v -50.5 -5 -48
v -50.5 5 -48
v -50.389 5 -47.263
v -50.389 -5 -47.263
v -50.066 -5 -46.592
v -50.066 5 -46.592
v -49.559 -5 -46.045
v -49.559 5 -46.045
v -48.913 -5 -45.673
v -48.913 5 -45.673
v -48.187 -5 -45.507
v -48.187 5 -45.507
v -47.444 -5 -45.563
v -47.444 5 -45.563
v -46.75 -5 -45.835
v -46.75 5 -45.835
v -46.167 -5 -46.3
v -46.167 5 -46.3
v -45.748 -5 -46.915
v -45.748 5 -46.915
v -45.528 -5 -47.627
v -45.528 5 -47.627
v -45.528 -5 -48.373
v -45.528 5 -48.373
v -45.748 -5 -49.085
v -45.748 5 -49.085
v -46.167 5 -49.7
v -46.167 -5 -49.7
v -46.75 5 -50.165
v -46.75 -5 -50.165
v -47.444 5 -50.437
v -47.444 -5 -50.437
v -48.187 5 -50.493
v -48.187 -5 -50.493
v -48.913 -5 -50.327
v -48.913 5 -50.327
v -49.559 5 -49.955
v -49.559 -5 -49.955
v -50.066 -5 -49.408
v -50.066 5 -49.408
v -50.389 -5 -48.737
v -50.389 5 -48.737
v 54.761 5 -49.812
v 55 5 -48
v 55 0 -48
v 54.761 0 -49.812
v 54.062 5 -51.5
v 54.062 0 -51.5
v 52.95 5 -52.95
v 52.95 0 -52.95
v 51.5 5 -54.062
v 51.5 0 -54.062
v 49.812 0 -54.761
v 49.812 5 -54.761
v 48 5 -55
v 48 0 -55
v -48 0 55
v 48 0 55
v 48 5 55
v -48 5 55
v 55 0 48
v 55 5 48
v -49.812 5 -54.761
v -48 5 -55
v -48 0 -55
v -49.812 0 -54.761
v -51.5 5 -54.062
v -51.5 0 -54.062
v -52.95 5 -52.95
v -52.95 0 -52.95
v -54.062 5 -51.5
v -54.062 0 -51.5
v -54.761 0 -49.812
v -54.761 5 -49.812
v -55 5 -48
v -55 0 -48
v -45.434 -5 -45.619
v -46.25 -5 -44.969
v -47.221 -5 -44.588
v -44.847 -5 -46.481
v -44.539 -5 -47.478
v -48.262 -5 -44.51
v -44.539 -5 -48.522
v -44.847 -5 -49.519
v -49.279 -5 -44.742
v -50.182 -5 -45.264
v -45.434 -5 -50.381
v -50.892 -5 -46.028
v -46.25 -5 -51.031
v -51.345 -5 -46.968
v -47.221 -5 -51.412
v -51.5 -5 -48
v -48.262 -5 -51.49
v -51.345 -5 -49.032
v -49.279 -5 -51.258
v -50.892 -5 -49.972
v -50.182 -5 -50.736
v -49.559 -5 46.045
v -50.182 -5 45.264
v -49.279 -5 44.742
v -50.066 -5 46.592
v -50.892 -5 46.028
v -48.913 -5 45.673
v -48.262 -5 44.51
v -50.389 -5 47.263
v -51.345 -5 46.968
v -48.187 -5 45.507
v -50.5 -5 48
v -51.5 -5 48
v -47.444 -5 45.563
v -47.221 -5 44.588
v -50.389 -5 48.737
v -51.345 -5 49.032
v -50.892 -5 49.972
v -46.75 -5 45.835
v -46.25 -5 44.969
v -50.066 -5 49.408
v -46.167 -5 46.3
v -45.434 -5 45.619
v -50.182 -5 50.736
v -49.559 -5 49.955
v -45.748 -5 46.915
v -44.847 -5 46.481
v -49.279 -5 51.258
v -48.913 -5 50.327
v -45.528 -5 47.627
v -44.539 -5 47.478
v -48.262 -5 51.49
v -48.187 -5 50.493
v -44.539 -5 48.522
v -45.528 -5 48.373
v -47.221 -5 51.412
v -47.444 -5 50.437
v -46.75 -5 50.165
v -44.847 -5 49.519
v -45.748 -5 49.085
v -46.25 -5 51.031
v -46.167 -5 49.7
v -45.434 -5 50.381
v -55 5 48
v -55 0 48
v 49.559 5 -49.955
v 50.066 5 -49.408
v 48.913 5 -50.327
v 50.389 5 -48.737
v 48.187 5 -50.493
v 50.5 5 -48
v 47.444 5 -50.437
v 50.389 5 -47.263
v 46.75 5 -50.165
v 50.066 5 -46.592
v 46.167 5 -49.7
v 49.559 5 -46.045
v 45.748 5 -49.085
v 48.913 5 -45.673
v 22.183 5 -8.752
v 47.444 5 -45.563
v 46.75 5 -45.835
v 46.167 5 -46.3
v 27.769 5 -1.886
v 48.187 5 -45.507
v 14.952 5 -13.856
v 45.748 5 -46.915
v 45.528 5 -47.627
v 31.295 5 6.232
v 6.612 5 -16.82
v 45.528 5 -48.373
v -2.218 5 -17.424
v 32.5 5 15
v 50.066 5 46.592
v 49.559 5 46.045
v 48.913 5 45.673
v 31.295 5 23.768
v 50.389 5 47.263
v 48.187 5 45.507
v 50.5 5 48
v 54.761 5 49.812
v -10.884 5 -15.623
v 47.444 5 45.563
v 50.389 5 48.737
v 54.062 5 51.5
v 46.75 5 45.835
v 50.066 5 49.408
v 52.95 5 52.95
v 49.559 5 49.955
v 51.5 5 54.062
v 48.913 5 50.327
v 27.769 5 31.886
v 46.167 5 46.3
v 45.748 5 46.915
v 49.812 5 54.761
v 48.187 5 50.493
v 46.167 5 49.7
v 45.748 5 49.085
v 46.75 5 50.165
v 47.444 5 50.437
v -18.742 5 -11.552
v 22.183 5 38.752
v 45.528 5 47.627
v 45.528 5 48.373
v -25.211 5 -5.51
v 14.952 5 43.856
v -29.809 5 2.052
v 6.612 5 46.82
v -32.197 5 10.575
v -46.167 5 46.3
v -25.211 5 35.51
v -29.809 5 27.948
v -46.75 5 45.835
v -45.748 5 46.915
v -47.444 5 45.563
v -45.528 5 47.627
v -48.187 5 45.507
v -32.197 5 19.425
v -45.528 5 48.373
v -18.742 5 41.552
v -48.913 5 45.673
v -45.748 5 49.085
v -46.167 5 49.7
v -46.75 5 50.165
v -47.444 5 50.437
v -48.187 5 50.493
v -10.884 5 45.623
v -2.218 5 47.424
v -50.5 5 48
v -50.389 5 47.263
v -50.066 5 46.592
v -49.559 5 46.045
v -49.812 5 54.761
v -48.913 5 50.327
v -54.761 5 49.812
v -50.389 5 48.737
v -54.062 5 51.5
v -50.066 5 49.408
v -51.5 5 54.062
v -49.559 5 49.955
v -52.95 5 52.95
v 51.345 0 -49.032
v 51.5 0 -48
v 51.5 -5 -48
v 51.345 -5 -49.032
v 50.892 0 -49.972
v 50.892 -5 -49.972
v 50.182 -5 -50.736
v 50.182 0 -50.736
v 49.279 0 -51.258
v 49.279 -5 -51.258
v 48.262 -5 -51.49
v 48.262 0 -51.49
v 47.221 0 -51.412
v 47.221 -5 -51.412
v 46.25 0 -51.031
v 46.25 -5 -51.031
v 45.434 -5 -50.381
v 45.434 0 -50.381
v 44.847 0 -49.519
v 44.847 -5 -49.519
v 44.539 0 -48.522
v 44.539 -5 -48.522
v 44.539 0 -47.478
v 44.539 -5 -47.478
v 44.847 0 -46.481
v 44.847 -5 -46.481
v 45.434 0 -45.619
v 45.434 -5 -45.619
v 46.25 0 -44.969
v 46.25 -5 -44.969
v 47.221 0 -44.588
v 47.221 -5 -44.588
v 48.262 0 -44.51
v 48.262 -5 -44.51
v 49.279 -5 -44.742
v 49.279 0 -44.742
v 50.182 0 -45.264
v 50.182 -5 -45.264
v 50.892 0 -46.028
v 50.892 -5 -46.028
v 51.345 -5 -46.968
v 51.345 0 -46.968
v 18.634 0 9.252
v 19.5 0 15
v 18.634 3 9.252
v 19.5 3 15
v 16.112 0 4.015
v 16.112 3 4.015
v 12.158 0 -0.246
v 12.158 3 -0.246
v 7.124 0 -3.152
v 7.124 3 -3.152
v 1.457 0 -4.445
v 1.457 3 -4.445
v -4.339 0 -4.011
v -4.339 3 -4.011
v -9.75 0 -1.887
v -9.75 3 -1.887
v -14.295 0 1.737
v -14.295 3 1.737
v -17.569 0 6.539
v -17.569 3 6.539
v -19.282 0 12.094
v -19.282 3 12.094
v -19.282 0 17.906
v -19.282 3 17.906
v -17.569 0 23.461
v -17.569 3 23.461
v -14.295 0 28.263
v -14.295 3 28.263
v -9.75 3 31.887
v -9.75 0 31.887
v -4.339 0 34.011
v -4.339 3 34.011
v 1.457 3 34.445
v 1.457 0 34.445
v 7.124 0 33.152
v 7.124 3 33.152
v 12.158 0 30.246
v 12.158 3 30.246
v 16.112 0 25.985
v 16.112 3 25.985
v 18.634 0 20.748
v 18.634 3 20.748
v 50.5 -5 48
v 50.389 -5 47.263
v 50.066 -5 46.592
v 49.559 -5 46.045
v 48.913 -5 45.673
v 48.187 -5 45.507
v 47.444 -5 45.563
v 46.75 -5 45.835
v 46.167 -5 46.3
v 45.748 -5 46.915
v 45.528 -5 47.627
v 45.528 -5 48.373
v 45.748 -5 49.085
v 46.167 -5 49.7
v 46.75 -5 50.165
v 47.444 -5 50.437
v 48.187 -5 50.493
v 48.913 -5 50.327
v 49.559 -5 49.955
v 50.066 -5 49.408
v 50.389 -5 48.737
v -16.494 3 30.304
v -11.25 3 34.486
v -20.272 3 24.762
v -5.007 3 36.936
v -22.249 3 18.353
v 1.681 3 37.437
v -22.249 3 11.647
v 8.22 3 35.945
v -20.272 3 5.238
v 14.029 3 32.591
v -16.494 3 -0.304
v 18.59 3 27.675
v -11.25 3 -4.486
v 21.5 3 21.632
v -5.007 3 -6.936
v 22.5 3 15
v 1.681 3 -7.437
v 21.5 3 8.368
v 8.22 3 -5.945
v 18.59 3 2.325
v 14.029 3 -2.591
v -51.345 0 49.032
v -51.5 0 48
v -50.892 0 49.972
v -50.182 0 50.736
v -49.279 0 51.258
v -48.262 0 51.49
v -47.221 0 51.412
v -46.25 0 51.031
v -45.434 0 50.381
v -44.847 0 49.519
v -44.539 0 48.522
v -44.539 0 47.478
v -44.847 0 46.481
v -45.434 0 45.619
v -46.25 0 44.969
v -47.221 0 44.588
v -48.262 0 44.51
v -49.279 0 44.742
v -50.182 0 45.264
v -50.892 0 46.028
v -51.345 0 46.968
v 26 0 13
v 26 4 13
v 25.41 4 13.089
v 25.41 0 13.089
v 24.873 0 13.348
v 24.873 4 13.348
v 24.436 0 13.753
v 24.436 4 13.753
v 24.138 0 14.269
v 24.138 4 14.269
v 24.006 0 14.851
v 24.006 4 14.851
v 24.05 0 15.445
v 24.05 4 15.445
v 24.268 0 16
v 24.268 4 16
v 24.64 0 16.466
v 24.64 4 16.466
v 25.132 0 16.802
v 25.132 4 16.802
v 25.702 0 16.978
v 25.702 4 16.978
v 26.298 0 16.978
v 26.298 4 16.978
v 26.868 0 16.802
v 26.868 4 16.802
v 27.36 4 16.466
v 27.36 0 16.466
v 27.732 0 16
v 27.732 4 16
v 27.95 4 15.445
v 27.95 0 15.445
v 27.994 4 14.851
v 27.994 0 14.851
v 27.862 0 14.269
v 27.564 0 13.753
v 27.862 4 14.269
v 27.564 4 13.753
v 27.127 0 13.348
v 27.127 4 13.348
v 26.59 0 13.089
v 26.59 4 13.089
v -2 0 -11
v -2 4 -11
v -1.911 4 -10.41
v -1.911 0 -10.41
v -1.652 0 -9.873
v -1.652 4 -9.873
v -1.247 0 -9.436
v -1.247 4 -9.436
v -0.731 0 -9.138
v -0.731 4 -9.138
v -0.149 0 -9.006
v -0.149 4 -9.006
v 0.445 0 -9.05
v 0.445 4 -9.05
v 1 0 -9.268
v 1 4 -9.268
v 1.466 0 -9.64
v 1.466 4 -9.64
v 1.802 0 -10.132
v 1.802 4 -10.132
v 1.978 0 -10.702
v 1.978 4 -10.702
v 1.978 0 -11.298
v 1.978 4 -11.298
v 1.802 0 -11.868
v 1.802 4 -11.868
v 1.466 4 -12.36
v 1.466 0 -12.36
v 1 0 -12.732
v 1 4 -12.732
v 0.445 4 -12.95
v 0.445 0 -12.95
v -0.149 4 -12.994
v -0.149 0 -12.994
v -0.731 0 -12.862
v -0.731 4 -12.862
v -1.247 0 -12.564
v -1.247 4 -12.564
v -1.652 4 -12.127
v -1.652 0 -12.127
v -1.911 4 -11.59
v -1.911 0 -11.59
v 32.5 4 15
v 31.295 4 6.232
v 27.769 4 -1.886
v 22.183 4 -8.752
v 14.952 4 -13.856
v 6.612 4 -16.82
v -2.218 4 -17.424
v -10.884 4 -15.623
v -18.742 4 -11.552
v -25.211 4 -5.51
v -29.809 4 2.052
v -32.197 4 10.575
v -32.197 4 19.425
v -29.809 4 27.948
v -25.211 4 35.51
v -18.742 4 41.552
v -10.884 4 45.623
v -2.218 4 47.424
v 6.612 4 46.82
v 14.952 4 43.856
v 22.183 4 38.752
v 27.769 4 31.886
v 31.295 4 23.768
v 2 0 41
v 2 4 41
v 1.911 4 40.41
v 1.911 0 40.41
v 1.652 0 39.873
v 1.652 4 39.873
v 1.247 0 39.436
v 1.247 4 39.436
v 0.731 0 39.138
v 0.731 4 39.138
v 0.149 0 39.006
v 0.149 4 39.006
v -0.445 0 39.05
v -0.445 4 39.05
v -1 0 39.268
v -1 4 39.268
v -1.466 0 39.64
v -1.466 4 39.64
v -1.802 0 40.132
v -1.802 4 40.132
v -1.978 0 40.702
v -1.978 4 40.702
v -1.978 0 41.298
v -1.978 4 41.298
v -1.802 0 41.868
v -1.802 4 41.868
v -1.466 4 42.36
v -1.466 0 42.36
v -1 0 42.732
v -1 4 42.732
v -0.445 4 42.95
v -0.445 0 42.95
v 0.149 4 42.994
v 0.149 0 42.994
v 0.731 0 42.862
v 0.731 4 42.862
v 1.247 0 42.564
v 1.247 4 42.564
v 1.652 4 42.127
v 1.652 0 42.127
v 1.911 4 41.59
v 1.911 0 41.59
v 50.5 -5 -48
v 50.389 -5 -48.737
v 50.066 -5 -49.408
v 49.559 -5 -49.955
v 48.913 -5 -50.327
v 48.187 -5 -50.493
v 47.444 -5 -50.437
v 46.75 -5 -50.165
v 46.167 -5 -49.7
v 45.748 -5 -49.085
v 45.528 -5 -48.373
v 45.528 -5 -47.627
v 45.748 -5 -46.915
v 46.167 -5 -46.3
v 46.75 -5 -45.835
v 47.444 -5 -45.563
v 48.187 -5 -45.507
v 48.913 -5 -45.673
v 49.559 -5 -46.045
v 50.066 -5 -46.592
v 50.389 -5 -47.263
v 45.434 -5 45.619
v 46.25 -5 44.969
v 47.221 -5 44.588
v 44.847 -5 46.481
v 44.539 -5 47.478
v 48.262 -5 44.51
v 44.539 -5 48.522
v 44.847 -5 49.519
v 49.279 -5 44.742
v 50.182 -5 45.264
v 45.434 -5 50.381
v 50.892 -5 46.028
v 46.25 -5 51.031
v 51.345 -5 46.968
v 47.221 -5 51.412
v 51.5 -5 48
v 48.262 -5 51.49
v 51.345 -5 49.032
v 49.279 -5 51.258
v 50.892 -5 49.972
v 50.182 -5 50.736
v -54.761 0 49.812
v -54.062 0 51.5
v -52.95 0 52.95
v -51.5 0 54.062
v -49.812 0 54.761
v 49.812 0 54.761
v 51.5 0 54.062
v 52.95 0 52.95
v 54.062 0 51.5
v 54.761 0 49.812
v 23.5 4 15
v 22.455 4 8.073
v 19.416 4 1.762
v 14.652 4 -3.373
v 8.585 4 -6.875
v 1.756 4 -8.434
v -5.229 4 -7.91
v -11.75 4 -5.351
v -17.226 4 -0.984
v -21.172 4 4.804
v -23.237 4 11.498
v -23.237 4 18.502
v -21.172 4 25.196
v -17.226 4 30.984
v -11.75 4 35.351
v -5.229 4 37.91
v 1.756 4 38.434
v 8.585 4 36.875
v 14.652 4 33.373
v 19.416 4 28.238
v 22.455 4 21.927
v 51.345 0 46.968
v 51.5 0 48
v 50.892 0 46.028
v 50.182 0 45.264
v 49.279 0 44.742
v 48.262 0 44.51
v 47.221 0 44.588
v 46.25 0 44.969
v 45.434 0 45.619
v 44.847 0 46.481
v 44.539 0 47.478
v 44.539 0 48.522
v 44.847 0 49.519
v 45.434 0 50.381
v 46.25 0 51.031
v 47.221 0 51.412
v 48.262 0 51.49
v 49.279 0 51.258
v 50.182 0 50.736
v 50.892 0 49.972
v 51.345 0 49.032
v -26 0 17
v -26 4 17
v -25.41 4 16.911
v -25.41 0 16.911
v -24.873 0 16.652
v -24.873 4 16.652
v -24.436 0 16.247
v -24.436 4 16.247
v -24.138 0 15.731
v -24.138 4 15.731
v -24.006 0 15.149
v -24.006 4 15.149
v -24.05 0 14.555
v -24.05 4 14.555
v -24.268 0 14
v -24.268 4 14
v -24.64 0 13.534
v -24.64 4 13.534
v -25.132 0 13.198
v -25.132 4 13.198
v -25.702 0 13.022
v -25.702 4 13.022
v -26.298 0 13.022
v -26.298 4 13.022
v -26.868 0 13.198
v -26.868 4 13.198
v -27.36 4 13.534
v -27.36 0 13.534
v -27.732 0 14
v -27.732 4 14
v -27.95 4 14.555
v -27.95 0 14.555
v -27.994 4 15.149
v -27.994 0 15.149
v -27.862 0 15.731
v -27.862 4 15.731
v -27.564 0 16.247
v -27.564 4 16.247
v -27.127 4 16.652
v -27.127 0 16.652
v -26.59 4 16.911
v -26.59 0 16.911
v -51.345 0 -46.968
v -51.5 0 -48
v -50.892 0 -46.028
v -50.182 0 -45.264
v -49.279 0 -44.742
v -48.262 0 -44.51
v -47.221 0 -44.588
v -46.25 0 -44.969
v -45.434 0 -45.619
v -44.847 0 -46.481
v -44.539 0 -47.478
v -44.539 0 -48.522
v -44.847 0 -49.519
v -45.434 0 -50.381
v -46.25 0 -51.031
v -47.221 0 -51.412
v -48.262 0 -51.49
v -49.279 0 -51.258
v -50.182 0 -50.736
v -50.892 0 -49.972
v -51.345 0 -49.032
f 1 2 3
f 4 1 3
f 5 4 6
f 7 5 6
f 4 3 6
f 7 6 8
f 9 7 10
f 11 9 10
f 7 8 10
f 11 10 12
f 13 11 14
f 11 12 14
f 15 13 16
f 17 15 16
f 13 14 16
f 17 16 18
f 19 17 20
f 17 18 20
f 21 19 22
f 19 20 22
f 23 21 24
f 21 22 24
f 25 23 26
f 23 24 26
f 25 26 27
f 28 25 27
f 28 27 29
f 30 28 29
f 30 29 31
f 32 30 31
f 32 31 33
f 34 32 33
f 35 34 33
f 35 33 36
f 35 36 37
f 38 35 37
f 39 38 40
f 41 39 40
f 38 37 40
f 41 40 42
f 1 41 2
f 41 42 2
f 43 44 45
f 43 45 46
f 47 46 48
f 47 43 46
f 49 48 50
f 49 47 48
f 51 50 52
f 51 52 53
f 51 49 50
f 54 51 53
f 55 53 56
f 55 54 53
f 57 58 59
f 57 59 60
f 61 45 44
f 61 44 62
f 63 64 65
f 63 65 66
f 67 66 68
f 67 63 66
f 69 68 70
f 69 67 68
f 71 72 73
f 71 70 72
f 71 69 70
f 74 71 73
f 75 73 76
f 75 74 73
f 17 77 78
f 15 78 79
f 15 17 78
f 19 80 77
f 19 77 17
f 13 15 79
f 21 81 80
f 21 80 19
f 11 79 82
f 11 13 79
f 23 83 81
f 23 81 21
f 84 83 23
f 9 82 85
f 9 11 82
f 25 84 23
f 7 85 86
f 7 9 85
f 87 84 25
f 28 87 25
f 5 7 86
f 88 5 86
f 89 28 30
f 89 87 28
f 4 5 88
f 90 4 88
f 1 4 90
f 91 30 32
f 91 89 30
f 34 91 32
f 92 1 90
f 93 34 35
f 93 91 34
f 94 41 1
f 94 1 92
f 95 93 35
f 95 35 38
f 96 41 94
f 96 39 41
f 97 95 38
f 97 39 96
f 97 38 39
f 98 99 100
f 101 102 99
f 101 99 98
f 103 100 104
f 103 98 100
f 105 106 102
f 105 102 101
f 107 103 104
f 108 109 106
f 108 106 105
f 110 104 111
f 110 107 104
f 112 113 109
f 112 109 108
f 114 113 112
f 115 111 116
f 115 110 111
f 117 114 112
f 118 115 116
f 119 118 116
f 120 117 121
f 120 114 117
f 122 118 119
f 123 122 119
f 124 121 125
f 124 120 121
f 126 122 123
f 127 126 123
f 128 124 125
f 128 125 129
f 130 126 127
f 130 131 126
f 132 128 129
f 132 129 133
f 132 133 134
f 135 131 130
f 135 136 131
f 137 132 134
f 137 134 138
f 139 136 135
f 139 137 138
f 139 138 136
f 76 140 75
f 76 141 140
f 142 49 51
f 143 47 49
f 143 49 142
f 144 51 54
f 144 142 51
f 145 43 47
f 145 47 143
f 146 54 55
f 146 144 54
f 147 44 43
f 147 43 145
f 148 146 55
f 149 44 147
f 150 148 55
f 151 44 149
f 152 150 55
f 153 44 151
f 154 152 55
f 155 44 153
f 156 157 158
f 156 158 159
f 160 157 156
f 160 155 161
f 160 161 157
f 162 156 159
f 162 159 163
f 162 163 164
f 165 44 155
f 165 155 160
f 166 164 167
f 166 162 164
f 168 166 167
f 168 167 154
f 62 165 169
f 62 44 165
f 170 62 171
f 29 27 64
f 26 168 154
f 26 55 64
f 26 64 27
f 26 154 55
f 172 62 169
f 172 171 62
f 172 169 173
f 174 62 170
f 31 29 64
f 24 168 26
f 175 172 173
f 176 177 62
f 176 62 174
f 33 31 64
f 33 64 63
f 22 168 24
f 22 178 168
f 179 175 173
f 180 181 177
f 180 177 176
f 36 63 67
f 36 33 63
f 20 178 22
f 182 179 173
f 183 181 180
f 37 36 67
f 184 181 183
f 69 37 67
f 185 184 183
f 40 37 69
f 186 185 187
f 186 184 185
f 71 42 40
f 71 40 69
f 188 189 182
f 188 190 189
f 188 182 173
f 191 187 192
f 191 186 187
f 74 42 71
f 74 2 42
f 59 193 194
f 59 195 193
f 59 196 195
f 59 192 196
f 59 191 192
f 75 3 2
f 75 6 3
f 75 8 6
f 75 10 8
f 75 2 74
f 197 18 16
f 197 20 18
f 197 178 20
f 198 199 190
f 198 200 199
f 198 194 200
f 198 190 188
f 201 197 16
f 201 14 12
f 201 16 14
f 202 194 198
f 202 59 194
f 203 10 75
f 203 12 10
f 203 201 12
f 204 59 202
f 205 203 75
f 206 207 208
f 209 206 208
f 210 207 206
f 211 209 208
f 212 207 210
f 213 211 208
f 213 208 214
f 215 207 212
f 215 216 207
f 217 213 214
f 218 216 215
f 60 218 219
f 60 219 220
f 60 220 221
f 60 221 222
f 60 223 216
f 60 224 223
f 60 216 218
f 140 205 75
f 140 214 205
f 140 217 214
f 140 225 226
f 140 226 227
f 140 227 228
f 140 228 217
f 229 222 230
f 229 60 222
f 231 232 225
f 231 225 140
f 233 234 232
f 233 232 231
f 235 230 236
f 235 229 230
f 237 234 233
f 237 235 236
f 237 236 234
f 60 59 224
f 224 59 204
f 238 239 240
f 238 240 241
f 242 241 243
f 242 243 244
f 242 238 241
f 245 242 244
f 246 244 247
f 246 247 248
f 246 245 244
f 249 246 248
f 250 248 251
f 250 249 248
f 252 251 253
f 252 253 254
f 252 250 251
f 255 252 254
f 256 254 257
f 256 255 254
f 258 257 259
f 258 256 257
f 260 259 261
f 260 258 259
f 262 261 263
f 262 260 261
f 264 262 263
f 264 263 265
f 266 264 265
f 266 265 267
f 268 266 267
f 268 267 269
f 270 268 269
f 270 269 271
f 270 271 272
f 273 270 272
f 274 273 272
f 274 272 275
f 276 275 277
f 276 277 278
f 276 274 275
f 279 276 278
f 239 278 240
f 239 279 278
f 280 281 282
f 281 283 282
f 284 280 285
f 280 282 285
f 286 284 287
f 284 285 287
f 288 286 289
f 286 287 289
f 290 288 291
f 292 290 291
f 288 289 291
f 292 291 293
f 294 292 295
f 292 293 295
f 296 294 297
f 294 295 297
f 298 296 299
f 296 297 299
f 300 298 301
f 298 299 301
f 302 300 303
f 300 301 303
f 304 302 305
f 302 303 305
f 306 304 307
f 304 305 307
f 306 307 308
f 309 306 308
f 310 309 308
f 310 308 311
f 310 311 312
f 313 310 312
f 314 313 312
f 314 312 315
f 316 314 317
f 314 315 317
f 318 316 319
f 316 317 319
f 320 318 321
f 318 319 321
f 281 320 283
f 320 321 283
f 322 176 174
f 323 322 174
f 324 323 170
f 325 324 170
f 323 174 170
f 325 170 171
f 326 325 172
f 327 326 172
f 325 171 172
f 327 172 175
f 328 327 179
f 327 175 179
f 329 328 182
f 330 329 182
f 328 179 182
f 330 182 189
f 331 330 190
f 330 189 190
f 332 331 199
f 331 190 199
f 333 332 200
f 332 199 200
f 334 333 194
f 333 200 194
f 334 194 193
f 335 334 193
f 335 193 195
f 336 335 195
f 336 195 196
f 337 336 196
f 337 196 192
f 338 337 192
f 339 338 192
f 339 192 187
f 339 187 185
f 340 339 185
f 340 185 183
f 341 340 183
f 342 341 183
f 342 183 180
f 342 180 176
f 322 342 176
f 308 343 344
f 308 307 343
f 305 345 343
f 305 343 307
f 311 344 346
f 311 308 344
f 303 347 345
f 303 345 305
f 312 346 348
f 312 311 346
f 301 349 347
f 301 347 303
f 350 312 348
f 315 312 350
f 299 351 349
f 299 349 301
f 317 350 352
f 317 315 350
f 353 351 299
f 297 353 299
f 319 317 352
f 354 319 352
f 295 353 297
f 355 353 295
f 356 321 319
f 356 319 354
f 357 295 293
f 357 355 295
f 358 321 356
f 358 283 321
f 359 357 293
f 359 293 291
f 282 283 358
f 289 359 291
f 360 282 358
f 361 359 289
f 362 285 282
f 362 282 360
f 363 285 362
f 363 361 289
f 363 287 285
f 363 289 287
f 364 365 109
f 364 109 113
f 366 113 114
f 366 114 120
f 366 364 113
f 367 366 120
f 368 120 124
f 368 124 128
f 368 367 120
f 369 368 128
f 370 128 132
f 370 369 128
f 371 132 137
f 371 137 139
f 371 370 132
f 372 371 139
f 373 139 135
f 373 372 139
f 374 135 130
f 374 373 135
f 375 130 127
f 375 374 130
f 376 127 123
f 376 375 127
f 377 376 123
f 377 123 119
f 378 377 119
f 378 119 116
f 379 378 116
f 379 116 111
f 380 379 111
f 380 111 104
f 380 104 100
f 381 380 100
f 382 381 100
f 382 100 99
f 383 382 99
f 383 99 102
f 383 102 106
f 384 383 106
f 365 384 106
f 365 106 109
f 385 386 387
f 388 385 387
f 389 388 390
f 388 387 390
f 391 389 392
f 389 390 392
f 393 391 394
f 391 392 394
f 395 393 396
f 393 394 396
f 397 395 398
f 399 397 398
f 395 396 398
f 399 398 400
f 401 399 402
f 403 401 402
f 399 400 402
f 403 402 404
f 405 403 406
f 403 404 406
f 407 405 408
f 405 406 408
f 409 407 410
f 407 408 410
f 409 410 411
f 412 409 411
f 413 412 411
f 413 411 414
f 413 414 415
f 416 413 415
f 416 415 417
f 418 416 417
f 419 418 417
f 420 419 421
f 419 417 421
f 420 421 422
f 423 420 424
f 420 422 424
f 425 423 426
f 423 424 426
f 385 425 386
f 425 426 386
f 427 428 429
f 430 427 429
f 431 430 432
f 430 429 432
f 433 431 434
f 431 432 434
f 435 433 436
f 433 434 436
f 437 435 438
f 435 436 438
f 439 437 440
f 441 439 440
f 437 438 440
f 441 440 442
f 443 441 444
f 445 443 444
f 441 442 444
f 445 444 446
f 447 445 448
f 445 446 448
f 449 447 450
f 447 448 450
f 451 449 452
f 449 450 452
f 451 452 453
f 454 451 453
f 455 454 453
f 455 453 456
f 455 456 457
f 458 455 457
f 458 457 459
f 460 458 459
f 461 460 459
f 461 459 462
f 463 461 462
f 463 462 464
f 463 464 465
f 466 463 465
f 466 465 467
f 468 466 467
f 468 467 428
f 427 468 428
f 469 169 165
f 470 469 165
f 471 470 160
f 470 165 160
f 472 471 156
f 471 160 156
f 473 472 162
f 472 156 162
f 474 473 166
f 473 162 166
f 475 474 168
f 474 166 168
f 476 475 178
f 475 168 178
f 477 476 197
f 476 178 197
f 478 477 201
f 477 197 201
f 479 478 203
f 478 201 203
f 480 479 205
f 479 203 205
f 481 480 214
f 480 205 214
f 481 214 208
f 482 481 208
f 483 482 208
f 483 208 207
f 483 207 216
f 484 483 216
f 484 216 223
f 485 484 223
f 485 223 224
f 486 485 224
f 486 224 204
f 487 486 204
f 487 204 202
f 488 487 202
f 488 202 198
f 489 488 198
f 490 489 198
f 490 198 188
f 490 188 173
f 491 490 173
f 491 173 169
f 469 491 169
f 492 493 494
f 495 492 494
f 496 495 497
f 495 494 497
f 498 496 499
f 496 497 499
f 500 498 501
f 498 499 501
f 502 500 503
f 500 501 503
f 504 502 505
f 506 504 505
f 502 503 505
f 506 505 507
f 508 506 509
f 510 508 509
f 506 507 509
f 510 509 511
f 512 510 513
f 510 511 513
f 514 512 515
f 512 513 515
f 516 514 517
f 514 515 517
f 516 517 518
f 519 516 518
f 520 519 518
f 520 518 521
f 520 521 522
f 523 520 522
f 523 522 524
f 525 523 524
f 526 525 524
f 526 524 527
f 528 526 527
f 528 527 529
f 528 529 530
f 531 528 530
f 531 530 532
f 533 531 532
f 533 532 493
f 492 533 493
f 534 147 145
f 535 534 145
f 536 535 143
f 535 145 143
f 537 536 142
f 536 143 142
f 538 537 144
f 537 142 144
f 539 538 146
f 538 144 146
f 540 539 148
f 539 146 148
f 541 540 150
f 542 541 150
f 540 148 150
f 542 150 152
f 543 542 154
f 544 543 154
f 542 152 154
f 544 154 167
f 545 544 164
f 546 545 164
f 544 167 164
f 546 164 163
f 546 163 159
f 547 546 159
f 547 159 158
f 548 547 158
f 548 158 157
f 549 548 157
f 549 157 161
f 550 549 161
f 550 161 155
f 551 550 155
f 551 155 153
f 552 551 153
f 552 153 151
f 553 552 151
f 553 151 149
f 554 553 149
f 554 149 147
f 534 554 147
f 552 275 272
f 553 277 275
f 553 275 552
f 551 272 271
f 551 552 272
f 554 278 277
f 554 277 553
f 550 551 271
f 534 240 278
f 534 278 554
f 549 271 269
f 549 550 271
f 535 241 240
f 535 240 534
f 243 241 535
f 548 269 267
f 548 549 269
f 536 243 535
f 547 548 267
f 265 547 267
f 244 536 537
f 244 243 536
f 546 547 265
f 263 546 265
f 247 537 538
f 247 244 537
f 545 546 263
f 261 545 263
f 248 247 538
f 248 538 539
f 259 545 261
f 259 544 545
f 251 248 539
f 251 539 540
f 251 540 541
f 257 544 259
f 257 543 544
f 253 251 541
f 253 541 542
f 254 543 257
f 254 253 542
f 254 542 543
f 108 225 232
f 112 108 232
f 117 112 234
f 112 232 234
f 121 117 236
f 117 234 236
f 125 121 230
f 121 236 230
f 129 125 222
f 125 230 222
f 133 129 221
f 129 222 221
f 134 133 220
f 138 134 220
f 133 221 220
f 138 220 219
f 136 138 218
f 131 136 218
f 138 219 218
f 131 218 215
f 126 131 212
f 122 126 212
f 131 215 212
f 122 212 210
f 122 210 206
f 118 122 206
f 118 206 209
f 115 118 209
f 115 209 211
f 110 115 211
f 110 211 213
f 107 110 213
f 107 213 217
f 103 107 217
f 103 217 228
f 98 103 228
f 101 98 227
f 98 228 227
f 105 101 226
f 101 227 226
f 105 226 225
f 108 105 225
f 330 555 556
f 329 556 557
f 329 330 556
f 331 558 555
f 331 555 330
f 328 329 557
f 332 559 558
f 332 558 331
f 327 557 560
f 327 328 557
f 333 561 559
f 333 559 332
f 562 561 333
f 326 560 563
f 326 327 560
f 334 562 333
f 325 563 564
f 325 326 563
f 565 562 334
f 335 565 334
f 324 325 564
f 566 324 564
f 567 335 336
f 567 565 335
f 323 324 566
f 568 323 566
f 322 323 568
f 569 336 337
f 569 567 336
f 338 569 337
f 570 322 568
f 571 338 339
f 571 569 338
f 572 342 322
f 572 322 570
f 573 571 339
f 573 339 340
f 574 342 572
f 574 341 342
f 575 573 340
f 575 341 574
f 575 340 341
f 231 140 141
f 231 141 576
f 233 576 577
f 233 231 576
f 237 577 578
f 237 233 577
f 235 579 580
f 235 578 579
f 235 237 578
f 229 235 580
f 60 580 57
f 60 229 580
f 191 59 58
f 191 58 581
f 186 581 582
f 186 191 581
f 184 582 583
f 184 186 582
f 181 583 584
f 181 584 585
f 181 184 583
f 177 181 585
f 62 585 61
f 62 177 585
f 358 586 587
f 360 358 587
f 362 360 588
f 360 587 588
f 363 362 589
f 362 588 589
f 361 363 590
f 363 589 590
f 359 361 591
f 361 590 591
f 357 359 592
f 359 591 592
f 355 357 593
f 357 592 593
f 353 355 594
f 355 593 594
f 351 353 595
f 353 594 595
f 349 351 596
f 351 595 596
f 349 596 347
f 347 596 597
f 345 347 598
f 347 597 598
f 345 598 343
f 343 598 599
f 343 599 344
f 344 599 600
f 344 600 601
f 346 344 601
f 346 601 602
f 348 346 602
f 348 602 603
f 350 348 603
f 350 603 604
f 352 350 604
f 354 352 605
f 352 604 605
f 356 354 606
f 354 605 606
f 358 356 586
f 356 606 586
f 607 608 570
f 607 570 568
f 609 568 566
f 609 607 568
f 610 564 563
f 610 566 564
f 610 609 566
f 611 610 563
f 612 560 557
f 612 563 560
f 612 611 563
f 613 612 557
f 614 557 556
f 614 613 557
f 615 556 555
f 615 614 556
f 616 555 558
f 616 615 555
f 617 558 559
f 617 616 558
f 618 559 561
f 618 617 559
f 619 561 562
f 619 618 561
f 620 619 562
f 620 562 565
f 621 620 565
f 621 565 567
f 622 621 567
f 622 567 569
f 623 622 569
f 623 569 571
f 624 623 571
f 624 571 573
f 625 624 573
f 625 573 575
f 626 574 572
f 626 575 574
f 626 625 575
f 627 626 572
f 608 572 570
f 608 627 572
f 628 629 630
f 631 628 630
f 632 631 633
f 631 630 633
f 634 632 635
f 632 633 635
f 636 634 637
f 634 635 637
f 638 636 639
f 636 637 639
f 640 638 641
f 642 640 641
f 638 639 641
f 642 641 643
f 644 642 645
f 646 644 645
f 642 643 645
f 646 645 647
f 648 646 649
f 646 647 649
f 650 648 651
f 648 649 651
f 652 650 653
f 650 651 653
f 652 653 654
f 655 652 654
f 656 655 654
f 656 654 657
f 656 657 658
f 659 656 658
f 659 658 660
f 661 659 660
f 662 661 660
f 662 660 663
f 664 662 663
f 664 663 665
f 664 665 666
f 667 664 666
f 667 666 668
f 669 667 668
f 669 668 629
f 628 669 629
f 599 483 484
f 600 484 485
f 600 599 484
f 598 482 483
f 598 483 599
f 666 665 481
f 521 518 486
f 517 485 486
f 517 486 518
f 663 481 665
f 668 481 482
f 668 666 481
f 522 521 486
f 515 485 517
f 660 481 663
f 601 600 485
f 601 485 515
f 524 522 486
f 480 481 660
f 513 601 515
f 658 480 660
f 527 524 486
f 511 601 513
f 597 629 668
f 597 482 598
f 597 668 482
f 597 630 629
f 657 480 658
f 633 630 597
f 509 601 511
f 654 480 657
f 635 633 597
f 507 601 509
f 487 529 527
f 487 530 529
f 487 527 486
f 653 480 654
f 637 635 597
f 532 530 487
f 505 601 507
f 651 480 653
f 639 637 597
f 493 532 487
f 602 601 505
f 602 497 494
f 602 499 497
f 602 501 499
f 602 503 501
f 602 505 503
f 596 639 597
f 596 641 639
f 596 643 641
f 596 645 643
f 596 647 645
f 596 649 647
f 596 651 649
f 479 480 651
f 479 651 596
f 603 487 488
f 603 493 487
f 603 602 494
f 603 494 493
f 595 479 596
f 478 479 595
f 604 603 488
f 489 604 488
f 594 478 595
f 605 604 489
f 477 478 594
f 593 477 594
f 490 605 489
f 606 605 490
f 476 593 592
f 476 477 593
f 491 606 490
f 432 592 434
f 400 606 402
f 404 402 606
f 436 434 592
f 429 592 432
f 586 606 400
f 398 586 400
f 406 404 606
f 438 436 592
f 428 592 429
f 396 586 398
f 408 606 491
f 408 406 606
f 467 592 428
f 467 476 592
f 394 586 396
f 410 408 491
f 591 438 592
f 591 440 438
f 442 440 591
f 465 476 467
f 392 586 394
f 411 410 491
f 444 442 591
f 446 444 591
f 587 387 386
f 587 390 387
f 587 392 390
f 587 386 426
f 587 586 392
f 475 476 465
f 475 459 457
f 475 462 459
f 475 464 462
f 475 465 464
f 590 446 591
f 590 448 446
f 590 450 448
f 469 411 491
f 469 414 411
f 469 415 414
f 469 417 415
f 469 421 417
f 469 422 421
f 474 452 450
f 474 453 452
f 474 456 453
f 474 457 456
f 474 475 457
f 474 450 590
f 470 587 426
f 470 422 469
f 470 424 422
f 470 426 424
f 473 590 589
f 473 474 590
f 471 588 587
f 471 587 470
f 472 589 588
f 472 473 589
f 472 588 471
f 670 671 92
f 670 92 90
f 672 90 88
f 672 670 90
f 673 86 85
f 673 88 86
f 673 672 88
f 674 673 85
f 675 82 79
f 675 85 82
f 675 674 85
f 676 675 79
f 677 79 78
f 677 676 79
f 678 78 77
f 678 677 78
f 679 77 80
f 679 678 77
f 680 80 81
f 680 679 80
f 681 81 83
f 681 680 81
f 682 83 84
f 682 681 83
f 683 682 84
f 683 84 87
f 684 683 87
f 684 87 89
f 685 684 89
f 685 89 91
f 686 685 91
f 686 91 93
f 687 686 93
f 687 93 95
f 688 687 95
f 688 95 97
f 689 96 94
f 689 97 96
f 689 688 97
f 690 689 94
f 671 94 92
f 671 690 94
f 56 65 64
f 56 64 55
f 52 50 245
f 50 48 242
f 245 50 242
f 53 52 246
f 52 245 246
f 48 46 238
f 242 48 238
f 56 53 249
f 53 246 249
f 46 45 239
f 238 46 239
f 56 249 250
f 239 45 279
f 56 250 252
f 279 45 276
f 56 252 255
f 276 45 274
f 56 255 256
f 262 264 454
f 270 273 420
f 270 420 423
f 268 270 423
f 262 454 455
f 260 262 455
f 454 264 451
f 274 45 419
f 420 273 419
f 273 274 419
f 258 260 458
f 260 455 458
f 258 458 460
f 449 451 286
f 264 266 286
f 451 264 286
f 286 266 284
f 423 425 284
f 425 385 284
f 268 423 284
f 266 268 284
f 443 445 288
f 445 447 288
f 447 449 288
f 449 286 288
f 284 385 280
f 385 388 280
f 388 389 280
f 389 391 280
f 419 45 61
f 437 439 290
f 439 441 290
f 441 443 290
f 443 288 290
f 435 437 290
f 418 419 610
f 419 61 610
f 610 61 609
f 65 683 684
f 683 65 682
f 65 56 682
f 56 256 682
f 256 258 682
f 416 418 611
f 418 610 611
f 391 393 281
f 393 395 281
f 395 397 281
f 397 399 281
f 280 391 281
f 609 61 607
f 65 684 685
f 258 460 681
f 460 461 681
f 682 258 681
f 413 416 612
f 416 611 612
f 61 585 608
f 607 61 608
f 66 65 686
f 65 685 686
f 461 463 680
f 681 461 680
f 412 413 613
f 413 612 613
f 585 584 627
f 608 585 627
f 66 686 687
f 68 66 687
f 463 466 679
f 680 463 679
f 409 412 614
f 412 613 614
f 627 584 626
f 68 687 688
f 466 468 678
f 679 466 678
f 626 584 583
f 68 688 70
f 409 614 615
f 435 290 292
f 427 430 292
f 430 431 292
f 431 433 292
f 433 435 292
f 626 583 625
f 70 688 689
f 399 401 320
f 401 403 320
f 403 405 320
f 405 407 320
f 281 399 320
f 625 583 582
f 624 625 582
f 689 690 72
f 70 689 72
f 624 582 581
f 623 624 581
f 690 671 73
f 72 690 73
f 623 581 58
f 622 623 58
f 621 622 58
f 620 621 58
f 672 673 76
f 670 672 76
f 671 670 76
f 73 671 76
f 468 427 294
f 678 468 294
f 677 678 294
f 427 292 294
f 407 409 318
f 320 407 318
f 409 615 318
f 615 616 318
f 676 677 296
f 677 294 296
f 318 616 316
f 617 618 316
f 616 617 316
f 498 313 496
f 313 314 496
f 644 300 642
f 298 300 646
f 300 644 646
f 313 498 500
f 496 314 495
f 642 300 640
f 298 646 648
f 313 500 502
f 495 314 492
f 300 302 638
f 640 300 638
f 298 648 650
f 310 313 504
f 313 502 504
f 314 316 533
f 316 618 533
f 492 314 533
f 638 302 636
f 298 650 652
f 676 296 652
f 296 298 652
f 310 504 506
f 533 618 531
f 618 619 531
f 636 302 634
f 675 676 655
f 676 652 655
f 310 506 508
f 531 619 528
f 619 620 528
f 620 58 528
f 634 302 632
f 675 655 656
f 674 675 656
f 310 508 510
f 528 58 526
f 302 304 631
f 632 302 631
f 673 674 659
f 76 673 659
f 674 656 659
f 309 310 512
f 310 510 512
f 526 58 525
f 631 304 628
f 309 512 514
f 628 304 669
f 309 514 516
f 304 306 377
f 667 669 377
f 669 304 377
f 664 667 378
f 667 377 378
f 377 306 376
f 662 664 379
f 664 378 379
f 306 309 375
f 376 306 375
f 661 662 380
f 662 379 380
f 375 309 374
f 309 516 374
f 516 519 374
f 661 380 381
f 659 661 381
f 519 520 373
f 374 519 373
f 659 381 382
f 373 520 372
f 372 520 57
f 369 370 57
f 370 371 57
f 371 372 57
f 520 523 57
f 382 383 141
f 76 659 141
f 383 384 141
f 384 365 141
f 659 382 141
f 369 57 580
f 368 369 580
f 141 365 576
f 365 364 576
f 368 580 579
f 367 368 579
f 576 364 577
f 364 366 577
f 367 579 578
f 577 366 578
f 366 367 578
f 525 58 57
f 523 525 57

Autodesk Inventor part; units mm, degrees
ref_plane "YZ Plane" through (0, 0, 0) normal (1, 0, 0) x (0, 1, 0)
ref_plane "XZ Plane" through (0, 0, 0) normal (0, 1, 0) x (-1, 0, 0)
ref_plane "XY Plane" through (0, 0, 0) normal (0, 0, 1) x (1, 0, 0)
sketch "스케치1" plane through (0, 0, 0) normal (0, 1, 0) x (-1, 0, 0)
  line L0 (-55, 55) -> (55, 55)
  line L1 (55, 55) -> (55, -55)
  line L2 (55, -55) -> (-55, -55)
  line L3 (-55, -55) -> (-55, 55)
  line L4 (-55, 55) -> (55, -55) construction
  line L5 (55, 55) -> (-55, -55) construction
  point P0 (0, 0)
  dimension "d0" = 110
  dimension "d1" = 110
extrude "돌출1" add sketch "스케치1" along normal blind 5
fillet "모깎기1" radius 7 1 edges at (55, 2.5, 55)
fillet "모깎기2" radius 7 3 edges at (55, 2.5, -55) (-55, 2.5, -55) (-55, 2.5, 55)
sketch "스케치9" plane through (0, 5, 0) normal (0, 1, 0) x (1, 0, 0)
  circle A0 centre (0, -15) radius 32.5
  line L0 (42.9638, 0) -> (-42.9638, 0) construction
  point P0 (0, 0)
  dimension "d32" = 65
  dimension "d33" = 15
extrude "돌출9" cut sketch "스케치9" against normal blind 1
sketch "스케치10" plane through (0, 4, 15) normal (0, 1, 0) x (1, 0, 0)
  circle A0 centre (0, 0) radius 22.5
  point P0 (0, 15)
  dimension "d36" = 45
extrude "돌출10" cut sketch "스케치10" against normal blind 1
sketch "스케치11" plane through (0, 3, 15) normal (0, 1, 0) x (1, 0, 0)
  circle A0 centre (0, 0) radius 19.5
  point P0 (0, 15)
  dimension "d39" = 39
extrude "돌출11" cut sketch "스케치11" against normal through all
chamfer "모따기2" distance 1 angle 45 1 edges at (-22.5, 4, 15)
sketch "스케치12" plane through (0, 4, 15) normal (0, 1, 0) x (1, 0, 0)
  circle A0 centre (0, 0) radius 26 construction
  circle A1 centre (0, -26) radius 2
  point P0 (0, 15)
  dimension "d48" = 52
  dimension "d49" = 4
extrude "돌출12" cut sketch "스케치12" against normal blind 10
pattern_circular "원형 패턴1" count 4 over 360 about axis through (0, 3.5, 15) along (0, 1, 0) of "돌출12"
sketch "스케치15" plane through (0, 5, 0) normal (0, 1, 0) x (1, 0, 0)
  arc A0 (48, -55) -> (55, -48) centre (48, -48) ccw projected
  circle A1 centre (48, -48) radius 2.538
  circle A2 centre (48, -48) radius 2.5
  point P0 (0, 0)
  dimension "d58" = 5
sketch "스케치16" plane through (0, 0, 0) normal (0, -1, 0) x (1, 0, 0)
  circle A0 centre (48, 48) radius 3.5
  point P0 (0, 0)
  dimension "d55" = 7
extrude "돌출13" add sketch "스케치16" along normal blind 5
mirror "미러7" about plane through (0, 0, 0) normal (0, 0, 1) of "돌출13"
mirror "미러8" about plane through (0, 0, 0) normal (1, 0, 0) of "돌출13", "미러7"
extrude "돌출14" cut sketch "스케치15" against normal through all contours A2
mirror "미러9" about plane through (0, 0, 0) normal (0, 0, 1) of "돌출14"
mirror "미러10" about plane through (0, 0, 0) normal (1, 0, 0) of "돌출14", "미러9"
properties part number "연결부"
